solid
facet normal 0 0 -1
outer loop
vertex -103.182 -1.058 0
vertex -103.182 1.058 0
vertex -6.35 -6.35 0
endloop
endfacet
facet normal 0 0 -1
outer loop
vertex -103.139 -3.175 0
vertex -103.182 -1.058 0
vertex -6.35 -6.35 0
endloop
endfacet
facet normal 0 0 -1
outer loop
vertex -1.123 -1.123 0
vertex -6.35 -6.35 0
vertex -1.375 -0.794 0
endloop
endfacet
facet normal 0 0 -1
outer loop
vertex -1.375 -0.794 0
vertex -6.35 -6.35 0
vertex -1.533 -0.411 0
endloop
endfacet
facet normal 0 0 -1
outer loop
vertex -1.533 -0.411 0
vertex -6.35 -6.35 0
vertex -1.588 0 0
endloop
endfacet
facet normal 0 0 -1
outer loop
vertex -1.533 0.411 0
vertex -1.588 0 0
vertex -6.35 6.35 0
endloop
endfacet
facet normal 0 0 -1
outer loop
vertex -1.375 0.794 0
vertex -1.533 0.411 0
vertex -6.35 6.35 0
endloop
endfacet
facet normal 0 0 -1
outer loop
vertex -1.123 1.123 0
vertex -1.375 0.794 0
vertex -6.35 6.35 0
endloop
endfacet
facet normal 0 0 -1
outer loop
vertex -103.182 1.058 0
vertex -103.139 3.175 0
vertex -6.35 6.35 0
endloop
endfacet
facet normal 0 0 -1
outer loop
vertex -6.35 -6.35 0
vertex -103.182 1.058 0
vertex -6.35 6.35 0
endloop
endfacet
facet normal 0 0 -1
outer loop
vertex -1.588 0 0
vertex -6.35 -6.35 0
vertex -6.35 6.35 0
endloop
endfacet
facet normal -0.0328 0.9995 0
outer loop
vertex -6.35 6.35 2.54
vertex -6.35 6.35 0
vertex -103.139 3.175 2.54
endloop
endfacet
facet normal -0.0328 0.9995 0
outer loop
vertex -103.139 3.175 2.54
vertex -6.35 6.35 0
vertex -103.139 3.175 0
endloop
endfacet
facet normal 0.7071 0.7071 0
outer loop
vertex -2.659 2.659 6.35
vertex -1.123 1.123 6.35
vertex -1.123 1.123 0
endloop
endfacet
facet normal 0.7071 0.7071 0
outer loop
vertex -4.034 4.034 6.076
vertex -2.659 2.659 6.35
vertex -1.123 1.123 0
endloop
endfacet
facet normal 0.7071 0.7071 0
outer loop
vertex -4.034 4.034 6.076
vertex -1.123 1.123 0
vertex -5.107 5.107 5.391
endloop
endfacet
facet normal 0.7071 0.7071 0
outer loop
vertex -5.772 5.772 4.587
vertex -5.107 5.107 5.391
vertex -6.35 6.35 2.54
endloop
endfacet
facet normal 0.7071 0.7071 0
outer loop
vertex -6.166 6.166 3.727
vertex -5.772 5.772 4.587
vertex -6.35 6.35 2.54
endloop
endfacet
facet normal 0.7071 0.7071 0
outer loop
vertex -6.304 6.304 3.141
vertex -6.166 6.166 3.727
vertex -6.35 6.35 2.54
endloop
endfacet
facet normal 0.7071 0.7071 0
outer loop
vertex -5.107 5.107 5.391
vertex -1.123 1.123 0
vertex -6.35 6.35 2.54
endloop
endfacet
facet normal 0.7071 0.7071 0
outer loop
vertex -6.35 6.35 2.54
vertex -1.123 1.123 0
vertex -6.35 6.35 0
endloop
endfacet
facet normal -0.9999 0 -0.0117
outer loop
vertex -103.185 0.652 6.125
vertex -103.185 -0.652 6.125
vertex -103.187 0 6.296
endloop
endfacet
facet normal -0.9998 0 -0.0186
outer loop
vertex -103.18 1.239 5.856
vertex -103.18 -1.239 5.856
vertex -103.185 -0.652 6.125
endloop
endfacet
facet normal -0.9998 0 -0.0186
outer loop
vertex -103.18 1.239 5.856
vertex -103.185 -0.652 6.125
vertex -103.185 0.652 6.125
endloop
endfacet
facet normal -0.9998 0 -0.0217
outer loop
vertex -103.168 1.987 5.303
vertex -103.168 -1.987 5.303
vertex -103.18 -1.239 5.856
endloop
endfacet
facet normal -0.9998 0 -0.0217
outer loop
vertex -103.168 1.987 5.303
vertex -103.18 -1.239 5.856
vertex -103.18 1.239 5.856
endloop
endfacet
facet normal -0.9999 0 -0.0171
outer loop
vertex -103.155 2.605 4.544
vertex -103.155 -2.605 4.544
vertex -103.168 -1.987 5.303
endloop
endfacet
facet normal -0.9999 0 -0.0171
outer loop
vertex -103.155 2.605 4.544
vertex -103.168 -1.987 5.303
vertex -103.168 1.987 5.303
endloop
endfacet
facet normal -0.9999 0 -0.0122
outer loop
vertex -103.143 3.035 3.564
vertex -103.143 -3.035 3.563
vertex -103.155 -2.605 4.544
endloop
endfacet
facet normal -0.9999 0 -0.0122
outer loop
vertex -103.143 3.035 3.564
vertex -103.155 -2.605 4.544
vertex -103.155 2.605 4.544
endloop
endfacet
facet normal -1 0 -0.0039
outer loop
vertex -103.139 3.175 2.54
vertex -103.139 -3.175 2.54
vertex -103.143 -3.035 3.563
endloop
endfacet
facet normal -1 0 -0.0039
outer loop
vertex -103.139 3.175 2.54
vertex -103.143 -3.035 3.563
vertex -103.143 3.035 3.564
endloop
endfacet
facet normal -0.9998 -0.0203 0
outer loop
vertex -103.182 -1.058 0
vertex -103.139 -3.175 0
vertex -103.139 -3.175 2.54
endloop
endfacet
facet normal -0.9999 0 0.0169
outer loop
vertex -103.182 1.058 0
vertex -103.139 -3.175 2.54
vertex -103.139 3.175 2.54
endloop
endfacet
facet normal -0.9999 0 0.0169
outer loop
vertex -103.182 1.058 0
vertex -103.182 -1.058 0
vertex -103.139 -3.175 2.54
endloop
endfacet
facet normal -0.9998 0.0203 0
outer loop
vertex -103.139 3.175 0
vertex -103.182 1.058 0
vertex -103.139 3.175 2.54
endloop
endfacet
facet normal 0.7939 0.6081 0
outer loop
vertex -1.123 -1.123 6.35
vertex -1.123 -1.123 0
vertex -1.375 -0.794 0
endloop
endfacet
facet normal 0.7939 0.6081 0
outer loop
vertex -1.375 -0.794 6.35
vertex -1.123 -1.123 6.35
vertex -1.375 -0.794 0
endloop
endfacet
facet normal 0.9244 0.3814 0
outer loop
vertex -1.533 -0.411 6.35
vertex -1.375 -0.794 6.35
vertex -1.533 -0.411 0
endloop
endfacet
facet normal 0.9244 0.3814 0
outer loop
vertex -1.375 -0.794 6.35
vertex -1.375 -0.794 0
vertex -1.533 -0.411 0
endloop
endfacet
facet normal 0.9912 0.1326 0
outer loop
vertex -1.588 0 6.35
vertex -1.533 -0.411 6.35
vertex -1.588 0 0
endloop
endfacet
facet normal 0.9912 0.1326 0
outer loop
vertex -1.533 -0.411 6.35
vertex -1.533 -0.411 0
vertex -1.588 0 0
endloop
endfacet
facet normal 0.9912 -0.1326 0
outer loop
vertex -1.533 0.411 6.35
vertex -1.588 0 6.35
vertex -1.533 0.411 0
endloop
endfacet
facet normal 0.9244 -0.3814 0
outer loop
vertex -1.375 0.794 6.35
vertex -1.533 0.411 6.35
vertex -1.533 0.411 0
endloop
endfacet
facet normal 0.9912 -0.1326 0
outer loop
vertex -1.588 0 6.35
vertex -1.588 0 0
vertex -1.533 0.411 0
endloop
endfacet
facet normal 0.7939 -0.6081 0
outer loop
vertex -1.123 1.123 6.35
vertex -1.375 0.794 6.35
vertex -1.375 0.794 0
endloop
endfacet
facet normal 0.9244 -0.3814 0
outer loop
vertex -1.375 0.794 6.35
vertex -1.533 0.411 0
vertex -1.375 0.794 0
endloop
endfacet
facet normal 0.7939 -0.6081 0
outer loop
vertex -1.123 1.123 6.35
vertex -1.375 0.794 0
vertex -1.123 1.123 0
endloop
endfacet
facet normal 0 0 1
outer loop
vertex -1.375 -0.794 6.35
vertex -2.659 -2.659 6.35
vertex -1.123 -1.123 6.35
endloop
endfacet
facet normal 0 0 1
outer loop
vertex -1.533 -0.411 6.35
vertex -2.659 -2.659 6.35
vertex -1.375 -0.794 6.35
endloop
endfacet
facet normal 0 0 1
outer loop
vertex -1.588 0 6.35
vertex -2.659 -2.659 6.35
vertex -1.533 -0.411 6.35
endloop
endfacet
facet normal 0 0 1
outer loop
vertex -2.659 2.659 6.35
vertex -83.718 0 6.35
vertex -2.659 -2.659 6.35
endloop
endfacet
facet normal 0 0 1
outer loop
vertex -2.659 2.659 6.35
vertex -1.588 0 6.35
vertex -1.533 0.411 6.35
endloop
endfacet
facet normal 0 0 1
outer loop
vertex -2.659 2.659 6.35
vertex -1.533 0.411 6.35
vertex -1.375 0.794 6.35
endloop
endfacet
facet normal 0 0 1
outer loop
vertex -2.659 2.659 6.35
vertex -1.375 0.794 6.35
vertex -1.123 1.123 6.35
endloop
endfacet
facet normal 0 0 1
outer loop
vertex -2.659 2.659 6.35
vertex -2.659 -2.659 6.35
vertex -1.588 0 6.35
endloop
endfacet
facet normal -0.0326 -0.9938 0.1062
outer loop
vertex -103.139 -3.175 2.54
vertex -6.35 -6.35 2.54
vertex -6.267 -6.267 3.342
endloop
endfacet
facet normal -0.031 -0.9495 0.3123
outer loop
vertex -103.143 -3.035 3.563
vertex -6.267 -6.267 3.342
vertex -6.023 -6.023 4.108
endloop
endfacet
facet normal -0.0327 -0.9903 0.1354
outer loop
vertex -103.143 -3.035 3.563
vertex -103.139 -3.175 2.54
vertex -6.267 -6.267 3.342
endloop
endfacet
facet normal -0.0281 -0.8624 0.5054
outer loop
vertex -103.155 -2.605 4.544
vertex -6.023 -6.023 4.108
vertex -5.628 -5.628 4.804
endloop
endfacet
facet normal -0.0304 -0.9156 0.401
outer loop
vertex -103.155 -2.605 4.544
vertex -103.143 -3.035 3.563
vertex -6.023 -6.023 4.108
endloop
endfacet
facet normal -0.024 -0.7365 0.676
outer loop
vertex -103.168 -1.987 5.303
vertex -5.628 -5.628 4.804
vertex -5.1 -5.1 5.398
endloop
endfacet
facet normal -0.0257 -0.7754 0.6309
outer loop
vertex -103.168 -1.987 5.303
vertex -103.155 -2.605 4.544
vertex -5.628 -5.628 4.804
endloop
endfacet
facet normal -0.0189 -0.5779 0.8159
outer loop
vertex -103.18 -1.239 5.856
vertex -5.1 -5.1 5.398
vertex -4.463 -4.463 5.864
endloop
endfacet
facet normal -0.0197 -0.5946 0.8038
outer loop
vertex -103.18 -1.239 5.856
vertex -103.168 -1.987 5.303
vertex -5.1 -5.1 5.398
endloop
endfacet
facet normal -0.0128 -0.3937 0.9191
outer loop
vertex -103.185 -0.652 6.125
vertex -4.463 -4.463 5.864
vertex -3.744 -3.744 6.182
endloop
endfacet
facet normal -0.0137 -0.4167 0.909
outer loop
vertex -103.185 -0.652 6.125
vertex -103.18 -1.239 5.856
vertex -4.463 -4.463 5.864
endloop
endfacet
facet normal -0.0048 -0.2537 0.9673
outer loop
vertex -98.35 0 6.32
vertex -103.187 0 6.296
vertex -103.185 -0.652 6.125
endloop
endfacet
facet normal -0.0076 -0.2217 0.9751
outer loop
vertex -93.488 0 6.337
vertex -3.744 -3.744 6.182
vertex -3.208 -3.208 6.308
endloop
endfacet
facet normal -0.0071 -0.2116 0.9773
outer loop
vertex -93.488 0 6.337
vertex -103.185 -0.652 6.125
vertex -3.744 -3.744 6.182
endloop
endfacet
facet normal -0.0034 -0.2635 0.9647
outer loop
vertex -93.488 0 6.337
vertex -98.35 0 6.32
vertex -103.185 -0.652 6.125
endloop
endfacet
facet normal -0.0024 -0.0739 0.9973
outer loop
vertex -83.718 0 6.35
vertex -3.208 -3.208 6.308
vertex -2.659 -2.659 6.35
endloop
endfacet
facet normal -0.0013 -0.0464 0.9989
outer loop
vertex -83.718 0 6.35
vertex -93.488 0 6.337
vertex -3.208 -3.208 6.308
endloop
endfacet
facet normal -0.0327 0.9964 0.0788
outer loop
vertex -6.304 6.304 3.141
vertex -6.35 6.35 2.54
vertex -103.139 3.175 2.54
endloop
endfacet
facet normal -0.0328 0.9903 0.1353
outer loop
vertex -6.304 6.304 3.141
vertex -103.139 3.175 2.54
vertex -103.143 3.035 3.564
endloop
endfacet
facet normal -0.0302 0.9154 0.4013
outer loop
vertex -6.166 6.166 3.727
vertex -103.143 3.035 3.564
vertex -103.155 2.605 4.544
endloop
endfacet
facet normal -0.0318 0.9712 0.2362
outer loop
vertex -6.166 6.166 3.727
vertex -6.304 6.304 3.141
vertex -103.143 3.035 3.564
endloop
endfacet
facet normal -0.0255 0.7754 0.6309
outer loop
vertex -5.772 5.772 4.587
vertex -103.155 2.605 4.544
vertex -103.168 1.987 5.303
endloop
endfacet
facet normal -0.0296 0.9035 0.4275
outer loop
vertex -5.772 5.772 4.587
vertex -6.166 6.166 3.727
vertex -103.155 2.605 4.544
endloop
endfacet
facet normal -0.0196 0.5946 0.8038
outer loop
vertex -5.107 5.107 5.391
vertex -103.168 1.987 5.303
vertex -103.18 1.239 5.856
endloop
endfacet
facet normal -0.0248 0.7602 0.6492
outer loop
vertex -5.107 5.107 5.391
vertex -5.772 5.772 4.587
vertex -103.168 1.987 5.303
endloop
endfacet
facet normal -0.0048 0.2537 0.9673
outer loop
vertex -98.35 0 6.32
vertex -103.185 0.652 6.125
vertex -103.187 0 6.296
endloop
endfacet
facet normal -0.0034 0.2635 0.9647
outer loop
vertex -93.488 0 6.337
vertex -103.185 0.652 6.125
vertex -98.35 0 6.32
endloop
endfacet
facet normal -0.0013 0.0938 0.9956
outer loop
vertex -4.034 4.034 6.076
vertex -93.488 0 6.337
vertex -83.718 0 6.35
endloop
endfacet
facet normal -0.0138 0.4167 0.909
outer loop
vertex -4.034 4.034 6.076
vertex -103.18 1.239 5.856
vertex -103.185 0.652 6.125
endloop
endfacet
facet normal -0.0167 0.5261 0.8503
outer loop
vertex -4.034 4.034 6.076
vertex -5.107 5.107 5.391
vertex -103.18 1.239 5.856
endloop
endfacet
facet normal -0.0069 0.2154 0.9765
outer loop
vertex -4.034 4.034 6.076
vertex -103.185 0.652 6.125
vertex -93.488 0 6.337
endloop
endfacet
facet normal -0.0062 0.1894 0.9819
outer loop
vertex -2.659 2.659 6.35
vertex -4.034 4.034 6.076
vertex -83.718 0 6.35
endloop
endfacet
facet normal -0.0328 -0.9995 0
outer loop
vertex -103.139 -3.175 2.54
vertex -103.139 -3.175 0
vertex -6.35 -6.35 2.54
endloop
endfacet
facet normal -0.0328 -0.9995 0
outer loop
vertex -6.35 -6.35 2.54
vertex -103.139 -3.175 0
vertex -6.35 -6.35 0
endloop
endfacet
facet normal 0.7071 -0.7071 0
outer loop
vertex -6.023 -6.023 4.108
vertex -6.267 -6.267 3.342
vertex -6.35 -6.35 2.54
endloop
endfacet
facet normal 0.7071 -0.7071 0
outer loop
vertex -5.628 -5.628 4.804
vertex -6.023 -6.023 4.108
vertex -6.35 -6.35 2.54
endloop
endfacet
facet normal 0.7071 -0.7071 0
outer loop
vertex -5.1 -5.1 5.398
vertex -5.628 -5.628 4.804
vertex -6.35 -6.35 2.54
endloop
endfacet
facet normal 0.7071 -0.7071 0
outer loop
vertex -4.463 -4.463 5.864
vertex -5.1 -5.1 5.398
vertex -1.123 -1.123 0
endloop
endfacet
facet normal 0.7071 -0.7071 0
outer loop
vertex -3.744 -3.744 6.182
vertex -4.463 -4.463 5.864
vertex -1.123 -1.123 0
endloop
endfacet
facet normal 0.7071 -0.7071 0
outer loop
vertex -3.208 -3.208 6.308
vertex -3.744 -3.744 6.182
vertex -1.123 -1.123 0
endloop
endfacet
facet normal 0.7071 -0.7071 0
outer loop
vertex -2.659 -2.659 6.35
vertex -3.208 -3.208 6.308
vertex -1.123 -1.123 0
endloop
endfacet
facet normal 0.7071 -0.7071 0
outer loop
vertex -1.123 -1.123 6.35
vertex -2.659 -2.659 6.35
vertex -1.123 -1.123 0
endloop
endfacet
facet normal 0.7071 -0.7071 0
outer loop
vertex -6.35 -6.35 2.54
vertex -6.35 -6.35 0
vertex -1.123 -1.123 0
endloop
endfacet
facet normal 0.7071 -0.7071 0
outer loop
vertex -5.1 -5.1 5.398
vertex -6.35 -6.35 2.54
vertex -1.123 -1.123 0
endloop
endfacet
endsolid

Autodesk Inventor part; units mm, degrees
ref_plane "YZ Plane" through (0, 0, 0) normal (1, 0, 0) x (0, 1, 0)
ref_plane "XZ Plane" through (0, 0, 0) normal (0, 1, 0) x (-1, 0, 0)
ref_plane "XY Plane" through (0, 0, 0) normal (0, 0, 1) x (1, 0, 0)
sketch "Sketch1" plane through (0, 0, 0) normal (0, 0, 1) x (1, 0, 0)
  line L0 (0, 0) -> (-6.35, 6.35)
  line L1 (-6.35, 6.35) -> (-103.1386, 3.175)
  line L2 (-103.1386, -3.175) -> (-6.35, -6.35)
  line L3 (-6.35, -6.35) -> (0, 0)
  arc A0 (-103.1386, 3.175) -> (-103.1386, -3.175) centre (0, 0) ccw
  line L4 (0, 0) -> (0.1245, 0) construction
  dimension "d1" = 6.35
  dimension "d3" = 6.35
  dimension "d10" = 135
  dimension "d11" = 103.1875
extrude "Extrusion1" add sketch "Sketch1" along normal blind 6.35
fillet "Fillet2" radius 3.81 2 edges at (-54.7443, -4.7625, 6.35) (-54.7443, 4.7625, 6.35)
hole "Hole1" at (0, 0, 6.35) direction (0, 0, -1) diameter 3.175 depth 25.4 tip angle 118
properties part number "Thrust_Support"
